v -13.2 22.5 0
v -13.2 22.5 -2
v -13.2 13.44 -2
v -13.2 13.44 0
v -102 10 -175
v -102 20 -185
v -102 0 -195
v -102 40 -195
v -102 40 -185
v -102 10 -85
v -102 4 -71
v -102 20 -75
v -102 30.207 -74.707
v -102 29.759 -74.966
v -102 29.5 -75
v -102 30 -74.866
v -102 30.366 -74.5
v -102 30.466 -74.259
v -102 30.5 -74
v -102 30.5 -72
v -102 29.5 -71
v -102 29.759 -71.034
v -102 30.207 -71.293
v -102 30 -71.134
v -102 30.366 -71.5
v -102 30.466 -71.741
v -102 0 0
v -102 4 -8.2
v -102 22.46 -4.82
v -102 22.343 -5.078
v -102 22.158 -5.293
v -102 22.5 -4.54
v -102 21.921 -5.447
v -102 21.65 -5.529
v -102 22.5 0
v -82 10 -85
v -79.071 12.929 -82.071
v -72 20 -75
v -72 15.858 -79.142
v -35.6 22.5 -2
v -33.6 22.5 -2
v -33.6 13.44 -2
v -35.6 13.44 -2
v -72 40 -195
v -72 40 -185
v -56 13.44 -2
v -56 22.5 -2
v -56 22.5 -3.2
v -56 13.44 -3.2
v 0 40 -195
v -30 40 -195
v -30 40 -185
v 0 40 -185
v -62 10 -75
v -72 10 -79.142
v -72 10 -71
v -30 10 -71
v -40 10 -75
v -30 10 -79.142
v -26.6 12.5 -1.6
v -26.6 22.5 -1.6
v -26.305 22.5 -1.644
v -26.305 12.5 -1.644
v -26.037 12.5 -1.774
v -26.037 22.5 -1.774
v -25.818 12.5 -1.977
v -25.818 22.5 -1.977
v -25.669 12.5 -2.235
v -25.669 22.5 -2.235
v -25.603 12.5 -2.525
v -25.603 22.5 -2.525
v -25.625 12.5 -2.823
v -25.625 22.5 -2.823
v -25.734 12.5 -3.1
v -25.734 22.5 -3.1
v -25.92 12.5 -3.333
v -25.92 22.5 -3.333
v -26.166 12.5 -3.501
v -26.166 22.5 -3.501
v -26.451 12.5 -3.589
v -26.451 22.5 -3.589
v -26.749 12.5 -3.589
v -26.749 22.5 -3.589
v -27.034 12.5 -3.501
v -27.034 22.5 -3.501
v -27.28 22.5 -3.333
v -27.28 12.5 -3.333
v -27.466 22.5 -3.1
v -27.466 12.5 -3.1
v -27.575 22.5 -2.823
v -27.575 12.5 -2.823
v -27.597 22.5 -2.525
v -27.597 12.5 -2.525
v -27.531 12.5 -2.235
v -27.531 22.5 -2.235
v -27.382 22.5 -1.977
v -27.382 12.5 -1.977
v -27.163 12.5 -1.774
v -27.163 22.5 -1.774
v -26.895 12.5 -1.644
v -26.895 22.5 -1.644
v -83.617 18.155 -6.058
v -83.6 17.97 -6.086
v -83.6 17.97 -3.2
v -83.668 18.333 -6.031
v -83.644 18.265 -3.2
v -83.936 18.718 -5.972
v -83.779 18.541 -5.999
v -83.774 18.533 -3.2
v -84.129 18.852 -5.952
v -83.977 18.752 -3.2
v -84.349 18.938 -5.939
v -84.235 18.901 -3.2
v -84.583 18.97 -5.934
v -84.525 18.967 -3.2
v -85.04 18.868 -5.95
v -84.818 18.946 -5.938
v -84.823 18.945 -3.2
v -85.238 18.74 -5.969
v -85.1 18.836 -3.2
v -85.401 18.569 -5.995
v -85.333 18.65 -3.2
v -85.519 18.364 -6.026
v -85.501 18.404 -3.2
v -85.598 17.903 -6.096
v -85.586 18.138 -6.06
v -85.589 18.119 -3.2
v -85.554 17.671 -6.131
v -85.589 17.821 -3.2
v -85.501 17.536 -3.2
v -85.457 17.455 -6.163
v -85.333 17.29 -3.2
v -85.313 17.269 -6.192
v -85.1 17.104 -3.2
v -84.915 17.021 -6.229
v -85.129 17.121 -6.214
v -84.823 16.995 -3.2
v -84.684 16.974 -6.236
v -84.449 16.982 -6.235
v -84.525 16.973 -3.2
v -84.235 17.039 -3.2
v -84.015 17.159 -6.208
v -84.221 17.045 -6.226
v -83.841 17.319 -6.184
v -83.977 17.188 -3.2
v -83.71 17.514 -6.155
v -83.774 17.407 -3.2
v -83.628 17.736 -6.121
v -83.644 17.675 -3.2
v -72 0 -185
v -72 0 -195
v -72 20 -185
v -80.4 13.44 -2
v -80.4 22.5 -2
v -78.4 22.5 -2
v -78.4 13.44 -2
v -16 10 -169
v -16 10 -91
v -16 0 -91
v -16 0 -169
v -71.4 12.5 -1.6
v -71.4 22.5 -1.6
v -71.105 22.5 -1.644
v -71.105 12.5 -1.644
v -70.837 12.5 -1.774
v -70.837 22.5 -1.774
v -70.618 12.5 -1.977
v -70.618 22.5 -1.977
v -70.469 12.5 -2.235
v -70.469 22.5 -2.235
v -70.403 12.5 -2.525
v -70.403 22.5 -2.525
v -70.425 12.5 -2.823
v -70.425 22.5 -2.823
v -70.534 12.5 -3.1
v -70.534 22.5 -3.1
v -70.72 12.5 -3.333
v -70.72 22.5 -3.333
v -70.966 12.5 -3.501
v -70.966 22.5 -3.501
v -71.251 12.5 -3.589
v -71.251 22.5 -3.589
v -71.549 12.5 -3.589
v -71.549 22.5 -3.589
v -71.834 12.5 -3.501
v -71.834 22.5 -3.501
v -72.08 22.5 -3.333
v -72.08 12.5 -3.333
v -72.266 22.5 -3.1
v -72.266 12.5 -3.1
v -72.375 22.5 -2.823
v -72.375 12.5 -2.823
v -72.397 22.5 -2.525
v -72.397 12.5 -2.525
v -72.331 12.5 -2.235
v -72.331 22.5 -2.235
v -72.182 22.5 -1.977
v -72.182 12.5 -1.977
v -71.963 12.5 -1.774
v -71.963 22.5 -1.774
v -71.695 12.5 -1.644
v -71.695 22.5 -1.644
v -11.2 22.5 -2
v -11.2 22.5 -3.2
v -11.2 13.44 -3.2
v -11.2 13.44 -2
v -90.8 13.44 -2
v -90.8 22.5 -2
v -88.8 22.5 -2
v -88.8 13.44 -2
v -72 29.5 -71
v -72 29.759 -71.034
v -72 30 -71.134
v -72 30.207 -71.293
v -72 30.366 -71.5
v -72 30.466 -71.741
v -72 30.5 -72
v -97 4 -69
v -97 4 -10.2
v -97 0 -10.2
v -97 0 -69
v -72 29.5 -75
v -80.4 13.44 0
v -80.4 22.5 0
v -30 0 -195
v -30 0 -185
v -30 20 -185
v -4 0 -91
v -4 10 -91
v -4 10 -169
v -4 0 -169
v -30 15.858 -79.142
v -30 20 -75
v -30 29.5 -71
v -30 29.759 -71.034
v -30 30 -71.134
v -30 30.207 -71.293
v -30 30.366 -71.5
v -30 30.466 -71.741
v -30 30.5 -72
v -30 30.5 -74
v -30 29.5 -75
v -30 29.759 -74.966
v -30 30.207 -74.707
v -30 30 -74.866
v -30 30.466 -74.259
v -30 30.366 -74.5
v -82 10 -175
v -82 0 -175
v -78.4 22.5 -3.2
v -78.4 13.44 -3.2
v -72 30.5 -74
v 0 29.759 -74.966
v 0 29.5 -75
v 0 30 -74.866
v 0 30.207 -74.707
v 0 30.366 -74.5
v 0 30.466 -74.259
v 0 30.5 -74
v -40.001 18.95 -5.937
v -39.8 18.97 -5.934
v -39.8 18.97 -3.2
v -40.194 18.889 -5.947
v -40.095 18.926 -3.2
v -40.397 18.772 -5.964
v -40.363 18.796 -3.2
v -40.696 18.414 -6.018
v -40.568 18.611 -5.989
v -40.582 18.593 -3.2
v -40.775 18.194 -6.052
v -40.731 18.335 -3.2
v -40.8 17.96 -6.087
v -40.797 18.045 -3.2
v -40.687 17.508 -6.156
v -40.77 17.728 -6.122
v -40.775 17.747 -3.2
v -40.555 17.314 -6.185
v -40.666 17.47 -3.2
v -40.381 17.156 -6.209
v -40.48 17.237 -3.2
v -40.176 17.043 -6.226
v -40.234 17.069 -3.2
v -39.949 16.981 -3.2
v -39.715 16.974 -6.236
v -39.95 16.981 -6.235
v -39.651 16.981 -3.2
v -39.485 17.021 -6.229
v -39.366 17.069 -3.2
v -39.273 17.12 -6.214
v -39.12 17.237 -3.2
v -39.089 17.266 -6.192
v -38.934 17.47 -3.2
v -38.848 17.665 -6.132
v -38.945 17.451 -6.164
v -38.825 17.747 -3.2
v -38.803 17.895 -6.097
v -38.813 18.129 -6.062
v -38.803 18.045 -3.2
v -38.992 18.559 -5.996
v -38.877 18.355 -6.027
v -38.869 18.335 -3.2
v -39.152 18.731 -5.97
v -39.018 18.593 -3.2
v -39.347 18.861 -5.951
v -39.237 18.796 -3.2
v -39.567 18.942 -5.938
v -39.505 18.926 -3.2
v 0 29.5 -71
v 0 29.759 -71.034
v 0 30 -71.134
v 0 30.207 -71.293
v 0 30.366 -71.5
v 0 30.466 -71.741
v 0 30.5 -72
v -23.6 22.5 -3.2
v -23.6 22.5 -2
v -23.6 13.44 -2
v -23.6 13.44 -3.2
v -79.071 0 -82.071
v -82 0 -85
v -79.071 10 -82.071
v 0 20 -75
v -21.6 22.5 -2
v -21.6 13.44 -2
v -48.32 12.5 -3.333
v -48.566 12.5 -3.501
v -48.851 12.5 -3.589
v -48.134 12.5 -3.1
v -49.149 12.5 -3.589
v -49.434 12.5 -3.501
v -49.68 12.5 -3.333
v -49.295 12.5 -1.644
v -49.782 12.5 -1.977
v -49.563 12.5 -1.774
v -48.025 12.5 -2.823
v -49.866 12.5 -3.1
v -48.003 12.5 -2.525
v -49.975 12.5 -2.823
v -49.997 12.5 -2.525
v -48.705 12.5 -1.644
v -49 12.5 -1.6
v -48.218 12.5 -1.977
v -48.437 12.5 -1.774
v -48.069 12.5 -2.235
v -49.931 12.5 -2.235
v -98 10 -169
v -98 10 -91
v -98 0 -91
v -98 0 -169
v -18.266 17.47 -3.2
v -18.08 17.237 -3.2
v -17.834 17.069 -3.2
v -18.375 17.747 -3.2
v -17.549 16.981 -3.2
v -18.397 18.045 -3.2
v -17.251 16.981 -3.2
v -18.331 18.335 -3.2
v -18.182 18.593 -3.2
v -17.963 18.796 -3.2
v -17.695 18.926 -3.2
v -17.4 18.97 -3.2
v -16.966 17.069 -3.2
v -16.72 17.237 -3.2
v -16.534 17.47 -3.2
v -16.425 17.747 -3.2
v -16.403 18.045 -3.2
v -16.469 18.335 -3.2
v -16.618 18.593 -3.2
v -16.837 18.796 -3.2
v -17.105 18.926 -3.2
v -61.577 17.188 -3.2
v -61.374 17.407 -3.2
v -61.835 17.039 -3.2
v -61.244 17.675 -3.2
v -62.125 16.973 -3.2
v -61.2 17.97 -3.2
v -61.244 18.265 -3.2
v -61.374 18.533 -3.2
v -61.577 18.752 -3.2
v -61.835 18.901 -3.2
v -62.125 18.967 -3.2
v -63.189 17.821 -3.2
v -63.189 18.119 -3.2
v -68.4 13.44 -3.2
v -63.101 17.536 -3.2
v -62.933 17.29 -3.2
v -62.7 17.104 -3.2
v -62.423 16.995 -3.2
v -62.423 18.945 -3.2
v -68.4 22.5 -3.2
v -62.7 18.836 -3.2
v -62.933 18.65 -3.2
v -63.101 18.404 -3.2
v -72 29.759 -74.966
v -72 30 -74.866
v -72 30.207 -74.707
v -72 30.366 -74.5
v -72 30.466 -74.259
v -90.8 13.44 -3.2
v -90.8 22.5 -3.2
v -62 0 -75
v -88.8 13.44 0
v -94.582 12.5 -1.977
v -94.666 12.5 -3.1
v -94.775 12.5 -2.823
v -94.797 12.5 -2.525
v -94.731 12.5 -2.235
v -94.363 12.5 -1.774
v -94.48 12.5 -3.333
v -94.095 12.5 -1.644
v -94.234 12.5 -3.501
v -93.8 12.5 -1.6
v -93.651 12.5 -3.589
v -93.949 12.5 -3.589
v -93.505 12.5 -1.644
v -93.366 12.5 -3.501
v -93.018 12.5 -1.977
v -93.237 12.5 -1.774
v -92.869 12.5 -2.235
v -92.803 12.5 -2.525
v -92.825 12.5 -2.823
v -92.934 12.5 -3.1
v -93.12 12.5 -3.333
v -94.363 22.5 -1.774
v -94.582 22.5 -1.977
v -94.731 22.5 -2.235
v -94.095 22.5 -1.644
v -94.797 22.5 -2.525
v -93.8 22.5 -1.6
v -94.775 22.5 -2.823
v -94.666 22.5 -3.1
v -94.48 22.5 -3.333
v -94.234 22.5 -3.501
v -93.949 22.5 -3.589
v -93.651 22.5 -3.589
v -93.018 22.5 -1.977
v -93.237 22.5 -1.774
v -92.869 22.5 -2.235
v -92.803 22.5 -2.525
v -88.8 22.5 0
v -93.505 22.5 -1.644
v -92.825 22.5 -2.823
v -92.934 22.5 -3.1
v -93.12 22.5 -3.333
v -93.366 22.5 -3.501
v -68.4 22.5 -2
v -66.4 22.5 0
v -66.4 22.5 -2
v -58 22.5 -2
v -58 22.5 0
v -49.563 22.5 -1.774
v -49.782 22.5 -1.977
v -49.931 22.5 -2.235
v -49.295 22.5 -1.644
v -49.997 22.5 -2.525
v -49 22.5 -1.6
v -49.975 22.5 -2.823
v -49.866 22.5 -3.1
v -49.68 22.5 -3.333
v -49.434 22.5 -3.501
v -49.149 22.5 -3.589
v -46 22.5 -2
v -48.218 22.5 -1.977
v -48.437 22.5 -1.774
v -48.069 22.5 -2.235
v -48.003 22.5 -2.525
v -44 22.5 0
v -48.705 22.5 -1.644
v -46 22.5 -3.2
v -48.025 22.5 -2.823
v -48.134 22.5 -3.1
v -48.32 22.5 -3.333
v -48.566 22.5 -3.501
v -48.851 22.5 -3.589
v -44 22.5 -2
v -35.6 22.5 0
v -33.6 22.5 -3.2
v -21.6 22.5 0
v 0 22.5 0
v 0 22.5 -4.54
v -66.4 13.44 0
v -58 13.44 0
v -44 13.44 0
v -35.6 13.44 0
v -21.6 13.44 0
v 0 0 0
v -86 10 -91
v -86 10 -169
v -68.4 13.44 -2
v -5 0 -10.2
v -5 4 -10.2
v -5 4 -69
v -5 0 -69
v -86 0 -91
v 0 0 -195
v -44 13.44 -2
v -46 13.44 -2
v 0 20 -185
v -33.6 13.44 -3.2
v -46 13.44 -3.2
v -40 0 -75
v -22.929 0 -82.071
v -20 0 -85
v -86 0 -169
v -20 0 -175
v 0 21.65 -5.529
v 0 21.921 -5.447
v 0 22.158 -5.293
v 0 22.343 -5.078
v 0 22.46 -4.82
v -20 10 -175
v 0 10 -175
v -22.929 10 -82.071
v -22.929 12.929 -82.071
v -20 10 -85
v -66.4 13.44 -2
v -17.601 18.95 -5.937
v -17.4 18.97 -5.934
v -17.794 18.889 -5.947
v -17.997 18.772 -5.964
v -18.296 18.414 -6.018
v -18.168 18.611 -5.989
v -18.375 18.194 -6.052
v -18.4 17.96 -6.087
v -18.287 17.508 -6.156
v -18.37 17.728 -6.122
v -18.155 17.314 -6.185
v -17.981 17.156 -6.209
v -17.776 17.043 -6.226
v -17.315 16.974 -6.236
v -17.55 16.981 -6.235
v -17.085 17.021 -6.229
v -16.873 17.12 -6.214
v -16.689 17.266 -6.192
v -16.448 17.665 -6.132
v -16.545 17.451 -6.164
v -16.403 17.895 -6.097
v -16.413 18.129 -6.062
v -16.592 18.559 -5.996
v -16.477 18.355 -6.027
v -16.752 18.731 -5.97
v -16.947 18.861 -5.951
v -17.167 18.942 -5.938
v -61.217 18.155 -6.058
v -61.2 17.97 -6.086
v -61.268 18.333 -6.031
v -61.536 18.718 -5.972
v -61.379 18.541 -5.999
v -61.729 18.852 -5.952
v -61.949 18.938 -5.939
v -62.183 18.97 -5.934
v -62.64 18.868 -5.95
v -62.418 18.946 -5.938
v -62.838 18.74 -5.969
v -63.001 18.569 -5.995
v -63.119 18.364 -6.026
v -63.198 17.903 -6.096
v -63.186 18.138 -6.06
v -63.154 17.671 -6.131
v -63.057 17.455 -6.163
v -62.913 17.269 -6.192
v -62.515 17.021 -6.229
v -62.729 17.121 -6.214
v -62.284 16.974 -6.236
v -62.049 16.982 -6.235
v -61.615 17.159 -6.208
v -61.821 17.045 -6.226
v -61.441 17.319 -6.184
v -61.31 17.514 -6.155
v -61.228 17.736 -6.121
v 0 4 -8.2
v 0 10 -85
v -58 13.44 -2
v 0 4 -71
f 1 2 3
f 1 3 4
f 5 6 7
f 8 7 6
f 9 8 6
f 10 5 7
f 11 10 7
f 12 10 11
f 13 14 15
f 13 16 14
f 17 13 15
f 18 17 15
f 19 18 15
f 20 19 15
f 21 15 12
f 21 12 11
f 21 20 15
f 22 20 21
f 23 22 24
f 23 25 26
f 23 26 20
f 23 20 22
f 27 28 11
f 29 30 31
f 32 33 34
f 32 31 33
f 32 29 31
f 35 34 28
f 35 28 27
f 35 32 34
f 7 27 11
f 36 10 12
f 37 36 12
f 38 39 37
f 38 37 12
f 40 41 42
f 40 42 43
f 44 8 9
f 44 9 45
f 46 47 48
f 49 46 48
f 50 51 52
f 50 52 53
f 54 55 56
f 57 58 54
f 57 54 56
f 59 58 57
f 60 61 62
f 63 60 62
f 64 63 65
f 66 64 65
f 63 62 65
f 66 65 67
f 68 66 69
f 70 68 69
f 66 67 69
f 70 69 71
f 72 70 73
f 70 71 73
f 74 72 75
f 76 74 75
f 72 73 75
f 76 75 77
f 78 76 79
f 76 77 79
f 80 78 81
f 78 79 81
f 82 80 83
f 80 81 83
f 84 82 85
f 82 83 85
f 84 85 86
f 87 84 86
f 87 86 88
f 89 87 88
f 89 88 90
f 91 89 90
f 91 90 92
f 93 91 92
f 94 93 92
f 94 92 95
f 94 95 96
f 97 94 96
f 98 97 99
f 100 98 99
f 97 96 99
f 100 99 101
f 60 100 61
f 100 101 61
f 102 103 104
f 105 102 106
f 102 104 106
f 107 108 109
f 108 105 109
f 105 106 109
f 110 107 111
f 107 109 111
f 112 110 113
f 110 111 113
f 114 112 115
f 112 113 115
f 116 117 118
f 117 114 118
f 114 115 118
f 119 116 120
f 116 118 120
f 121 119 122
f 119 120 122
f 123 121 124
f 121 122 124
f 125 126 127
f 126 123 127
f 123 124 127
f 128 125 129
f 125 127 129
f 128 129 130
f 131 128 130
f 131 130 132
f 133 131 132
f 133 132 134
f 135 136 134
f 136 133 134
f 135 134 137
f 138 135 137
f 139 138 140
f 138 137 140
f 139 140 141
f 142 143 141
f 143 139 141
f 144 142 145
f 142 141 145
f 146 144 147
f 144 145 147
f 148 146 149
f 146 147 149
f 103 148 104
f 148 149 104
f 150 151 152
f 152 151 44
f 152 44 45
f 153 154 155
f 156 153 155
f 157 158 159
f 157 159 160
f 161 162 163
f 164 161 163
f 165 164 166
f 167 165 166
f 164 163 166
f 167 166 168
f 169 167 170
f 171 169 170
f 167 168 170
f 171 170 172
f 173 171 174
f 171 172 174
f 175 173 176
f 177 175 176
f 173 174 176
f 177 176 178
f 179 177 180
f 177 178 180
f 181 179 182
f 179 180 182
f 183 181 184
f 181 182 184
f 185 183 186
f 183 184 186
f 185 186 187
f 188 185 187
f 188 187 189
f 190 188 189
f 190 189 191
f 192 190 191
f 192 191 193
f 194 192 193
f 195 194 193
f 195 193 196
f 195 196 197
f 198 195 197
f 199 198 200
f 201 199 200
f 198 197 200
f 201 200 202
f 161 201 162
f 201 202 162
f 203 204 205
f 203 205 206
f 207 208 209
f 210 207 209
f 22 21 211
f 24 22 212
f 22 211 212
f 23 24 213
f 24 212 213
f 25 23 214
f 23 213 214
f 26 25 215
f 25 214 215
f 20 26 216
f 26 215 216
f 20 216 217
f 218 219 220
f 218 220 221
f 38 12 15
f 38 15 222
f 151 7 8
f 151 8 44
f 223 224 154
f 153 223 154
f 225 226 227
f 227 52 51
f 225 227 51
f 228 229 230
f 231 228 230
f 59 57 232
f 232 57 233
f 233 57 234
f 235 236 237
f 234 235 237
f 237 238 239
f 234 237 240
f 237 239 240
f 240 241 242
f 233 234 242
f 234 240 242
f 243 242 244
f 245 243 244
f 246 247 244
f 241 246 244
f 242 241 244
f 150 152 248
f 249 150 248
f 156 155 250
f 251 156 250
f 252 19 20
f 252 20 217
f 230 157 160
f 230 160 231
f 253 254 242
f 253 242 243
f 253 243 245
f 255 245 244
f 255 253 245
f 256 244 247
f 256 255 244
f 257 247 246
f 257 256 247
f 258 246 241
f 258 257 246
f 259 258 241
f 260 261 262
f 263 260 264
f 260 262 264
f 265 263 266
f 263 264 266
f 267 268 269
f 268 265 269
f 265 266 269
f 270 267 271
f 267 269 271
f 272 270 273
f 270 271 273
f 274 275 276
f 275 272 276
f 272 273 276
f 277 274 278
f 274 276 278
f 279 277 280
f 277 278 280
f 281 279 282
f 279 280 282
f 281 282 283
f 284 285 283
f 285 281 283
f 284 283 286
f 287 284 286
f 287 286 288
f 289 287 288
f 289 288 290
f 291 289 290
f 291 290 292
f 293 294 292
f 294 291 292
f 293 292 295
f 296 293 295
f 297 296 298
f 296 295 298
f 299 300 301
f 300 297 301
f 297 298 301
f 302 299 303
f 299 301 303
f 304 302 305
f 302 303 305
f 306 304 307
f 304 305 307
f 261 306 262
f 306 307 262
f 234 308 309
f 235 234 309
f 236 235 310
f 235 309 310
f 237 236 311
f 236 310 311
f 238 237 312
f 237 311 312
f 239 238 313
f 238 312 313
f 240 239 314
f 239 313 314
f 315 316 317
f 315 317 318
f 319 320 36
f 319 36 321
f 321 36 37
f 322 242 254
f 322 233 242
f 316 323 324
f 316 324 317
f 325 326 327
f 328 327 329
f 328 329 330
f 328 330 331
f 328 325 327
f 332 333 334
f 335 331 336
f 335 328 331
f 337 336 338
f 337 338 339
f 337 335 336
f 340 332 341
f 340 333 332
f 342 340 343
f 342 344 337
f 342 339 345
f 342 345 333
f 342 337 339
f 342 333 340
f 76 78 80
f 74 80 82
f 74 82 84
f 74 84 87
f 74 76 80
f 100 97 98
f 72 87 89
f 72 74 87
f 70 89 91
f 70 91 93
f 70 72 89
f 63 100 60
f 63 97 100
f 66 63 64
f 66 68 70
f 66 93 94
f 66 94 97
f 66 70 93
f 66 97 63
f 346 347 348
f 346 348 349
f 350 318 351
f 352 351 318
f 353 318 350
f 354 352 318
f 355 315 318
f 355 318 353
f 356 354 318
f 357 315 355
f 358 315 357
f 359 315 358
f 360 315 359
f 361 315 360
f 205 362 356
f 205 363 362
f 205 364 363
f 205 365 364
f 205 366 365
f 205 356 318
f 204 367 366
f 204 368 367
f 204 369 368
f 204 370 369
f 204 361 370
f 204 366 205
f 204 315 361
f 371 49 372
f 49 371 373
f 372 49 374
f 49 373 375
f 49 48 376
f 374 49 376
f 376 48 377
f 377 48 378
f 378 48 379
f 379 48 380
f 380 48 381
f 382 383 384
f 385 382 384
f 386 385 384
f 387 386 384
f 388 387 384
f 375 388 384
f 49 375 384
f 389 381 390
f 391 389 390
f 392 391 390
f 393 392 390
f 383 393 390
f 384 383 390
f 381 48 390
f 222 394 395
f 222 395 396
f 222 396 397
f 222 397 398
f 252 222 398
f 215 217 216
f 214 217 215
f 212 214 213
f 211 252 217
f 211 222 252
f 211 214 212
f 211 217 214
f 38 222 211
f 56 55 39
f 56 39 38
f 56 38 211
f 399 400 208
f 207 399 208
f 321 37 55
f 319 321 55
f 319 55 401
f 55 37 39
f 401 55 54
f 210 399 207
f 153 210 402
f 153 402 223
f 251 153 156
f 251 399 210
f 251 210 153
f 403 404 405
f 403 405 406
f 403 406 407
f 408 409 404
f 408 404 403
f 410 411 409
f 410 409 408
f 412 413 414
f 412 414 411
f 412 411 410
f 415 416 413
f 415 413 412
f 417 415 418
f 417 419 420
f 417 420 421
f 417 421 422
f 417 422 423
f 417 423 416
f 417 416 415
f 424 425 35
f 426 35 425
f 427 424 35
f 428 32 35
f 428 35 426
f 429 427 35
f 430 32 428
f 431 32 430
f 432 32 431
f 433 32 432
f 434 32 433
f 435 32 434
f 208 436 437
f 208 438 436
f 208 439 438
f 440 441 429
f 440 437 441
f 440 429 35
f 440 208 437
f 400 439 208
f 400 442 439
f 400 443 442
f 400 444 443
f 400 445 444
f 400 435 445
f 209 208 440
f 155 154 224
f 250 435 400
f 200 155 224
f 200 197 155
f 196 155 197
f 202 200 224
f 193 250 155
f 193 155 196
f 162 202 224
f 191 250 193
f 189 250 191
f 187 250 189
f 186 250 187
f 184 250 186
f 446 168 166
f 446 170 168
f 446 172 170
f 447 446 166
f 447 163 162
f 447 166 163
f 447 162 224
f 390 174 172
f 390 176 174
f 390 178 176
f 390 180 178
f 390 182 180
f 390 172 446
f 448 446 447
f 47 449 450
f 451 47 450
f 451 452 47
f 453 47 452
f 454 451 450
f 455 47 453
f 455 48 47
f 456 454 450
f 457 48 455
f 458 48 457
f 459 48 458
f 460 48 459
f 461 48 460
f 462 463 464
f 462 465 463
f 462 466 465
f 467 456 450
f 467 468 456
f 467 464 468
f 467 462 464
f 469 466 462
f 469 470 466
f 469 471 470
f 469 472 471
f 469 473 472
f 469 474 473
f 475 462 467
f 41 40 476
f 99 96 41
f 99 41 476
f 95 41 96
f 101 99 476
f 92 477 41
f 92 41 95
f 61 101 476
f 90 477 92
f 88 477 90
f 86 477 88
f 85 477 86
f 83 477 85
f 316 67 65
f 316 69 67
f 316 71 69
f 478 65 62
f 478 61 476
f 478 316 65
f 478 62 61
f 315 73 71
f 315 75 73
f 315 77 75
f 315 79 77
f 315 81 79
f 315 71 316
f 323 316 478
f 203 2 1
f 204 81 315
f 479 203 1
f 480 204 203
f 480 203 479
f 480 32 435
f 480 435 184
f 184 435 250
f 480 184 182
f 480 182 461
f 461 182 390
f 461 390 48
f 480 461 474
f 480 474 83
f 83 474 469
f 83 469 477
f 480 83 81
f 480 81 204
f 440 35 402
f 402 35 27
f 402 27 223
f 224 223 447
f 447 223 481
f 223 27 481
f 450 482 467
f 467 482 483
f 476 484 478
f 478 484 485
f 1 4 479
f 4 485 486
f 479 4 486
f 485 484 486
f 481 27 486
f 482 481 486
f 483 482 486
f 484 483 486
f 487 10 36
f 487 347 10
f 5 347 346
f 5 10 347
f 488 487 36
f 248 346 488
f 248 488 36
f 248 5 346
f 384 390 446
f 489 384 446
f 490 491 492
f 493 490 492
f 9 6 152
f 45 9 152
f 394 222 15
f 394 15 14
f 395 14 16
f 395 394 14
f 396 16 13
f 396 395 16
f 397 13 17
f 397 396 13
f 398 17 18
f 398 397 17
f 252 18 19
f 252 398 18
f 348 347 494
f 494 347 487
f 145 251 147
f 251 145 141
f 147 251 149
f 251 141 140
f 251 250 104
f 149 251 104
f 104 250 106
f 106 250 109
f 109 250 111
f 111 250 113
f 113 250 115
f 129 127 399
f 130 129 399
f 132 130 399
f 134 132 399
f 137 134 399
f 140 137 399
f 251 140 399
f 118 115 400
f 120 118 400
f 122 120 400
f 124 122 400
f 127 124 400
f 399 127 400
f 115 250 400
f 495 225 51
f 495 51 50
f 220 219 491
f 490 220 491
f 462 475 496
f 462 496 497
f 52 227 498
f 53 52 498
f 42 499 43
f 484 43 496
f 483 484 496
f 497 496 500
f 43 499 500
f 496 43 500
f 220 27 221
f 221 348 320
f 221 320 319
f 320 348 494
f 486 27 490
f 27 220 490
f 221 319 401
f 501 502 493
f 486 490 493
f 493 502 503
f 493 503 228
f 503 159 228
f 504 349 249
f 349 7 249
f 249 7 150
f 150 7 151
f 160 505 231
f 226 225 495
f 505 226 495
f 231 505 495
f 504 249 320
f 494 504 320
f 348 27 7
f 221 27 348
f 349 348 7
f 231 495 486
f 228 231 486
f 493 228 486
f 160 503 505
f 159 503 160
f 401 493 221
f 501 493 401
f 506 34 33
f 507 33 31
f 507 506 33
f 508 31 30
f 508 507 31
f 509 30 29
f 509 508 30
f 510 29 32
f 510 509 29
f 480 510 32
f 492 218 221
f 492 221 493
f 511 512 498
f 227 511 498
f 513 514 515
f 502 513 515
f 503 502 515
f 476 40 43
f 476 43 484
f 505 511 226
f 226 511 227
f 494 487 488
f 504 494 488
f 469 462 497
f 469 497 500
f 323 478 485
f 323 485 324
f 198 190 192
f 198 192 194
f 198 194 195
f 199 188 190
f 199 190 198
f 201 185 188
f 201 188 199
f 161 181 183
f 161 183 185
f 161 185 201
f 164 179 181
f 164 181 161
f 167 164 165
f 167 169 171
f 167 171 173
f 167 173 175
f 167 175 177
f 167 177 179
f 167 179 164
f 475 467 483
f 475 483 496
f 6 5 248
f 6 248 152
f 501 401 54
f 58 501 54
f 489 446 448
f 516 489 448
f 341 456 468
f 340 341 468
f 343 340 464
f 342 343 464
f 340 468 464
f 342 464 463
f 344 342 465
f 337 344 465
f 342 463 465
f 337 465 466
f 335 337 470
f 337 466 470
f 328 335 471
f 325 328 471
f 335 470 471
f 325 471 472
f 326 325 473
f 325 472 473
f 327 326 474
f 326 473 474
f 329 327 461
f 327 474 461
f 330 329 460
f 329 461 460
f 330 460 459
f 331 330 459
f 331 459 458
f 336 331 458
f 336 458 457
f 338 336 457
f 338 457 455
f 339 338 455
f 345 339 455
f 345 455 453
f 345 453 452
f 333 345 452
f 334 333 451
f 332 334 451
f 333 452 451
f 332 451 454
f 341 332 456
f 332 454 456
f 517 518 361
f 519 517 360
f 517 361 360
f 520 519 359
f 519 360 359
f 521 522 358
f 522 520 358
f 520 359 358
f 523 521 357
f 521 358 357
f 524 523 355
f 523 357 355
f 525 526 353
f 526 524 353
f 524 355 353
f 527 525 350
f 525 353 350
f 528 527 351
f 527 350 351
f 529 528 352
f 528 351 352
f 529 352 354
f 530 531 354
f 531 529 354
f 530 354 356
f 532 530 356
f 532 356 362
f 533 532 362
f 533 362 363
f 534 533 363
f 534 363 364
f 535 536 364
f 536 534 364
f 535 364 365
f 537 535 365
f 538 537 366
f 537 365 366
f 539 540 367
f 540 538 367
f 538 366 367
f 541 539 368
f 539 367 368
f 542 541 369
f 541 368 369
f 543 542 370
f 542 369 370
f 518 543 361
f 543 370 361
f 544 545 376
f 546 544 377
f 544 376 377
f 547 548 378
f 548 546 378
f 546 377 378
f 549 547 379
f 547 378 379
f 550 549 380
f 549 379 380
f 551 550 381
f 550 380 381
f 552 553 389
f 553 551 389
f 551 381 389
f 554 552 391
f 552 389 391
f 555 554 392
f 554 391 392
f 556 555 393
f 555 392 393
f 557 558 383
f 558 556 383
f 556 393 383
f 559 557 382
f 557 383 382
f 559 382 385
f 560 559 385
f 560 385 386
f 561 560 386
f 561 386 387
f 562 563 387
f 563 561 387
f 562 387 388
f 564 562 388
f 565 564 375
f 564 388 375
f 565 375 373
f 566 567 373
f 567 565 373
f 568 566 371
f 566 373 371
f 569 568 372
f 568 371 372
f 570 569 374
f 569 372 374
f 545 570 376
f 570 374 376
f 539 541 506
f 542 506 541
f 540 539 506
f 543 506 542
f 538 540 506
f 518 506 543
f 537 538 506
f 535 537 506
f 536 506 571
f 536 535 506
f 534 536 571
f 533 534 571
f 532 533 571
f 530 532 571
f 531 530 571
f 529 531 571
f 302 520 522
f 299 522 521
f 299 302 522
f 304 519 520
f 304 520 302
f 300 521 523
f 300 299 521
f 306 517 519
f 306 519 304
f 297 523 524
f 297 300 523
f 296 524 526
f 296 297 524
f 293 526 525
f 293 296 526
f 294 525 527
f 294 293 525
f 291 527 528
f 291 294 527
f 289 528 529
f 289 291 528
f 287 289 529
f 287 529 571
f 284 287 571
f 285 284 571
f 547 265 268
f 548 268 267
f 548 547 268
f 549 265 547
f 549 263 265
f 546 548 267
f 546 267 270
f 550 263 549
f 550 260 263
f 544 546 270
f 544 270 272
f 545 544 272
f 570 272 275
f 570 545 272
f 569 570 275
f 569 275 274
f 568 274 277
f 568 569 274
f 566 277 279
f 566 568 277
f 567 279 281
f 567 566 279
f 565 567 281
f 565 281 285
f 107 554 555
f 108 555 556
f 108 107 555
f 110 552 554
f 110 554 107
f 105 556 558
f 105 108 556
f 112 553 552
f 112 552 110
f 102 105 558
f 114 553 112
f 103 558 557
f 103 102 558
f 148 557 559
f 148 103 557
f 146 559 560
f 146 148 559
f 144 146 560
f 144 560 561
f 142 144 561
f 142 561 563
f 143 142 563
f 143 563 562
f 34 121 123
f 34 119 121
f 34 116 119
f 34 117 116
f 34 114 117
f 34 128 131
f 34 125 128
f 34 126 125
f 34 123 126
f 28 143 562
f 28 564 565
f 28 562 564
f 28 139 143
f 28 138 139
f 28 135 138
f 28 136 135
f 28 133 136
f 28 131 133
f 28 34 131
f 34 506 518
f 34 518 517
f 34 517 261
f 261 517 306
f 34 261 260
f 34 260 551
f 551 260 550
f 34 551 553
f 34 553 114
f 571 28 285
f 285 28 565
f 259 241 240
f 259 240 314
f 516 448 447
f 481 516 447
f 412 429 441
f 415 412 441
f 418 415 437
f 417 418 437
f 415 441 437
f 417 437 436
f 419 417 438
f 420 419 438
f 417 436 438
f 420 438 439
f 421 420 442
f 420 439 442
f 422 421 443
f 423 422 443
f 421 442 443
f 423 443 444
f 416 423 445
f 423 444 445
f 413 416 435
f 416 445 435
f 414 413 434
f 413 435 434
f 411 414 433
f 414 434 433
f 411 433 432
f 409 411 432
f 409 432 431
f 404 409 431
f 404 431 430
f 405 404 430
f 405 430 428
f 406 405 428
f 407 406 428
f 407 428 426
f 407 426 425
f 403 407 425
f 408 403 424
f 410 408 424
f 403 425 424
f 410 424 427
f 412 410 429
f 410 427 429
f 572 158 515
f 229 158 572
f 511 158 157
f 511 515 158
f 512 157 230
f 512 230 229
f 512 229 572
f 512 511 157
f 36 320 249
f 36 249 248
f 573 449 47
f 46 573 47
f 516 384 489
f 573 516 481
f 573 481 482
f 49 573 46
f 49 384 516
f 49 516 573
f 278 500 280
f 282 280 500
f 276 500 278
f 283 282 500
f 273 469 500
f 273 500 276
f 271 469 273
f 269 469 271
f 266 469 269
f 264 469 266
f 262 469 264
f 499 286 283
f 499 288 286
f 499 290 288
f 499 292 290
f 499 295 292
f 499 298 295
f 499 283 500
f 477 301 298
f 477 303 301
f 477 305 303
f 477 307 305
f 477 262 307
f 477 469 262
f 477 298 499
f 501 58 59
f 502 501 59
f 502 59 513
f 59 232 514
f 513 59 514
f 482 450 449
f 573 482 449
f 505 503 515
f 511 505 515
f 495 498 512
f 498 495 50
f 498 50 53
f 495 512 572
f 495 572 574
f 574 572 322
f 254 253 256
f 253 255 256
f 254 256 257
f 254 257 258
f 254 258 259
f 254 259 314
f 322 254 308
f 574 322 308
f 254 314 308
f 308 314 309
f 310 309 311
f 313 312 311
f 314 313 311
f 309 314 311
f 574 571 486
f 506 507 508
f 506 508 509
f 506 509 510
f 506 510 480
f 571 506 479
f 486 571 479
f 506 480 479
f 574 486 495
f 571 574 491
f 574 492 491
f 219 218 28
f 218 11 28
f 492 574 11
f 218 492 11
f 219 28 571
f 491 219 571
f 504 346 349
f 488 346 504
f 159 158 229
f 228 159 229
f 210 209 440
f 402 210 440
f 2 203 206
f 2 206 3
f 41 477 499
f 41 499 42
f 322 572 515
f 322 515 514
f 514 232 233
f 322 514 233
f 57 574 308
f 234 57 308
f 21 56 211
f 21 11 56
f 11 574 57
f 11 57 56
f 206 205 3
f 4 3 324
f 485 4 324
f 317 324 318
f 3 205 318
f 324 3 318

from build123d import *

# Parameters (mm, degrees)
SKETCH_1_W           = 102
SKETCH_1_H           = 75
EXTRUDE_1_DEPTH      = 22.5
CUT_EXTRUDE_1_DEPTH  = 9.06
SKETCH_3_W           = 102
SKETCH_3_H           = 66.8
CUT_EXTRUDE_2_DEPTH  = 12
SKETCH_4_W           = 62.8
SKETCH_4_H           = 6.5
CUT_EXTRUDE_3_DEPTH  = 129.589463021
SKETCH_6_W           = 102
SKETCH_6_H           = 4
EXTRUDE_2_DEPTH      = 20
SKETCH_7_W           = 92
SKETCH_7_H           = 58.8
CUT_EXTRUDE_5_DEPTH  = 8
CUT_EXTRUDE_6_DEPTH  = 108
FILLET_2_R           = 1
SKETCH_10_R          = 1
CUT_EXTRUDE_7_DEPTH  = 10
SKETCH_14_R          = 1
CUT_EXTRUDE_8_DEPTH  = 10
SKETCH_15_W          = 20
SKETCH_15_H          = 10
EXTRUDE_3_DEPTH      = 120
SKETCH_16_W          = 10
SKETCH_16_H          = 10
EXTRUDE_4_DEPTH      = 80
CHAMFER_1_SIZE       = 10
SKETCH_17_W          = 102
SKETCH_17_H          = 10
EXTRUDE_5_DEPTH      = 30
CUT_EXTRUDE_9_DEPTH  = 50
SKETCH_20_W          = 12
SKETCH_20_H          = 78
CUT_EXTRUDE_10_DEPTH = 50
SKETCH_21_W          = 4
SKETCH_21_H          = 10
EXTRUDE_6_DEPTH      = 50
CHAMFER_2_SIZE       = 10
CHAMFER_3_SIZE       = 10


with BuildPart() as part:
    # 草图1 → 凸台-拉伸1 (new body)
    with BuildSketch(Plane(origin=(0, 0, 0), x_dir=(1, 0, 0), z_dir=(0, 1, 0))):
        with Locations((-51, 37.5)):
            Rectangle(SKETCH_1_W, SKETCH_1_H)
    extrude(amount=EXTRUDE_1_DEPTH)

    # 草图2 → 切除-拉伸1 (cut)
    with BuildSketch(Plane(origin=(0, 22.5, 0), x_dir=(1, 0, 0), z_dir=(0, 1, 0))):
        Polygon((-90.8, 2), (-88.8, 2), (-88.8, 0), (-80.4, 0), (-80.4, 2), (-78.4, 2), (-78.4, 3.2), (-90.8, 3.2), align=None)
        Polygon((-68.4, 2), (-66.4, 2), (-66.4, 0), (-58, 0), (-58, 2), (-56, 2), (-56, 3.2), (-68.4, 3.2), align=None)
        Polygon((-46, 3.2), (-33.6, 3.2), (-33.6, 2), (-35.6, 2), (-35.6, 0), (-44, 0), (-44, 2), (-46, 2), align=None)
        Polygon((-23.6, 3.2), (-11.2, 3.2), (-11.2, 2), (-13.2, 2), (-13.2, 0), (-21.6, 0), (-21.6, 2), (-23.6, 2), align=None)
    extrude(amount=-CUT_EXTRUDE_1_DEPTH, mode=Mode.SUBTRACT)

    # 草图3 → 切除-拉伸2 (cut)
    with BuildSketch(Plane(origin=(0, 22.5, 0), x_dir=(1, 0, 0), z_dir=(0, 1, 0))):
        with Locations((-51, 41.6)):
            Rectangle(SKETCH_3_W, SKETCH_3_H)
    extrude(amount=-CUT_EXTRUDE_2_DEPTH, mode=Mode.SUBTRACT)

    # 草图4 → 切除-拉伸3 (cut, through all)
    with BuildSketch(Plane.ZY.offset(102)):
        with Locations((-39.6, 7.25)):
            Rectangle(SKETCH_4_W, SKETCH_4_H)
    extrude(amount=-CUT_EXTRUDE_3_DEPTH, mode=Mode.SUBTRACT)

    # 草图6 → 凸台-拉伸2 (add)
    with BuildSketch(Plane(origin=(0, 10.5, 0), x_dir=(1, 0, 0), z_dir=(0, 1, 0))):
        with Locations((-51, 73)):
            Rectangle(SKETCH_6_W, SKETCH_6_H)
    extrude(amount=EXTRUDE_2_DEPTH)

    # 草图7 → 切除-拉伸5 (cut)
    with BuildSketch(Plane(origin=(0, 4, 0), x_dir=(1, 0, 0), z_dir=(0, 1, 0))):
        with Locations((-51, 39.6)):
            Rectangle(SKETCH_7_W, SKETCH_7_H)
    extrude(amount=-CUT_EXTRUDE_5_DEPTH, mode=Mode.SUBTRACT)

    # 草图9 → 切除-拉伸6 (cut)
    with BuildSketch(Plane.ZY.offset(102)):
        Polygon((-8.2, 22.5), (-5.4, 22.5), (-8.2, 4), align=None)
    extrude(amount=-CUT_EXTRUDE_6_DEPTH, mode=Mode.SUBTRACT)

    # 圆角2
    fillet_2_edges = [part.edges().sort_by_distance(p)[0] for p in [
        (-51, 30.5, -71),
        (-51, 30.5, -75),
        (-51, 22.5, -5.4),
    ]]
    fillet(fillet_2_edges, radius=FILLET_2_R)

    # 草图10 → 切除-拉伸7 (cut)
    with BuildSketch(Plane.XY.offset(-3.2)):
        with Locations((-84.6, 17.97)):
            Circle(SKETCH_10_R)
        with Locations((-62.2, 17.97)):
            Circle(SKETCH_10_R)
        with Locations(Location((-39.8, 17.97, 0), (0, 0, 90))):
            Circle(SKETCH_10_R)
        with Locations(Location((-17.4, 17.97, 0), (0, 0, 90))):
            Circle(SKETCH_10_R)
    extrude(amount=-CUT_EXTRUDE_7_DEPTH, mode=Mode.SUBTRACT)

    # 草图14 → 切除-拉伸8 (cut)
    with BuildSketch(Plane(origin=(0, 22.5, 0), x_dir=(1, 0, 0), z_dir=(0, 1, 0))):
        with Locations(Location((-93.8, 2.6, 0), (0, 0, 270))):
            Circle(SKETCH_14_R)
        with Locations(Location((-71.4, 2.6, 0), (0, 0, 270))):
            Circle(SKETCH_14_R)
        with Locations(Location((-49, 2.6, 0), (0, 0, 270))):
            Circle(SKETCH_14_R)
        with Locations(Location((-26.6, 2.6, 0), (0, 0, 270))):
            Circle(SKETCH_14_R)
    extrude(amount=-CUT_EXTRUDE_8_DEPTH, mode=Mode.SUBTRACT)

    # 草图15 → 凸台-拉伸3 (add)
    with BuildSketch(Plane(origin=(0, 0, -75), x_dir=(-1, 0, 0), z_dir=(0, 0, -1))):
        with Locations((10, 5)):
            Rectangle(SKETCH_15_W, SKETCH_15_H)
        with Locations((92, 5)):
            Rectangle(SKETCH_15_W, SKETCH_15_H)
    extrude(amount=EXTRUDE_3_DEPTH)

    # 草图16 → 凸台-拉伸4 (add)
    with BuildSketch(Plane(origin=(-82, 0, 0), x_dir=(0, 0, -1), z_dir=(1, 0, 0))):
        with Locations((190, 5)):
            Rectangle(SKETCH_16_W, SKETCH_16_H)
    extrude(amount=EXTRUDE_4_DEPTH)

    # 倒角1
    chamfer_1_edges = [part.edges().sort_by_distance(p)[0] for p in [
        (-20, 5, -75),
        (-82, 5, -75),
        (-20, 5, -185),
        (-82, 5, -185),
    ]]
    chamfer(chamfer_1_edges, length=CHAMFER_1_SIZE)

    # 草图17 → 凸台-拉伸5 (add)
    with BuildSketch(Plane(origin=(0, 10, 0), x_dir=(1, 0, 0), z_dir=(0, 1, 0))):
        with Locations((-51, 190)):
            Rectangle(SKETCH_17_W, SKETCH_17_H)
    extrude(amount=EXTRUDE_5_DEPTH)

    # 草图19 → 切除-拉伸9 (cut)
    with BuildSketch(Plane(origin=(0, 40, 0), x_dir=(1, 0, 0), z_dir=(0, 1, 0))):
        Polygon((-72, 185), (-72, 75), (-72, 71), (-30, 71), (-30, 75), (-30, 185), (-30, 195), (-72, 195), align=None)
    extrude(amount=-CUT_EXTRUDE_9_DEPTH, mode=Mode.SUBTRACT)

    # 草图20 → 切除-拉伸10 (cut)
    with BuildSketch(Plane(origin=(0, 10, 0), x_dir=(1, 0, 0), z_dir=(0, 1, 0))):
        with Locations((-92, 130)):
            Rectangle(SKETCH_20_W, SKETCH_20_H)
        with Locations((-10, 130)):
            Rectangle(SKETCH_20_W, SKETCH_20_H)
    extrude(amount=-CUT_EXTRUDE_10_DEPTH, mode=Mode.SUBTRACT)

    # 草图21 → 凸台-拉伸6 (add)
    with BuildSketch(Plane(origin=(-72, 0, 0), x_dir=(0, 0, -1), z_dir=(1, 0, 0))):
        with Locations((73, 5)):
            Rectangle(SKETCH_21_W, SKETCH_21_H)
    extrude(amount=EXTRUDE_6_DEPTH)

    # 倒角2
    # the kernel refuses this chamfer: 10 mm, written as the material it adds along each edge
    with BuildSketch(Plane(origin=(-30, 0, -75), x_dir=(-0.9998910622590237, 0, 0.01476020374253316), z_dir=(0, 1, 0))) as chamfer_2_piece_1:
        Polygon((CHAMFER_2_SIZE * 0.999891062259, -CHAMFER_2_SIZE * 0.0147602037425), (-CHAMFER_2_SIZE * 0.717466790729, -CHAMFER_2_SIZE * 0.696592710413), (0, 0), align=None)
    extrude(amount=10)
    with BuildSketch(Plane(origin=(-72, 0, -75), x_dir=(0.9998910622590237, 0, 0.01476020374253316), z_dir=(0, 1, 0))) as chamfer_2_piece_2:
        Polygon((CHAMFER_2_SIZE * 0.999891062259, CHAMFER_2_SIZE * 0.0147602037425), (-CHAMFER_2_SIZE * 0.717466790729, CHAMFER_2_SIZE * 0.696592710413), (0, 0), align=None)
    extrude(amount=10)

    # 倒角3
    # the kernel refuses this chamfer: 10 mm, written as the material it adds along each edge
    with BuildSketch(Plane(origin=(-30, 10, -75), x_dir=(0, -0.027495876610585588, -0.9996219169112968), z_dir=(1, 0, 0))) as chamfer_3_piece_1_section:
        Polygon((CHAMFER_3_SIZE * 0.999621916911, CHAMFER_3_SIZE * 0.0274958766106), (-CHAMFER_3_SIZE * 0.0274958766106, CHAMFER_3_SIZE * 0.999621916911), (0, 0), align=None)
    chamfer_3_piece_1 = extrude(amount=30, mode=Mode.PRIVATE)
    chamfer_3_piece_1 = split(chamfer_3_piece_1, bisect_by=Plane(origin=(-27.264199431, 13.202688984, -77.735800569), z_dir=(-0.7071067811865476, 0, -0.7071067811865476)), keep=Keep.TOP, mode=Mode.PRIVATE)
    chamfer_3_piece_1 = split(chamfer_3_piece_1, bisect_by=Plane(origin=(-28.501657804, 13.202688984, -79.762769282), z_dir=(0.382683432365518, 0, 0.9238795325111094)), keep=Keep.TOP, mode=Mode.PRIVATE)
    add(chamfer_3_piece_1)
    with BuildSketch(Plane(origin=(-30, 10, -75), x_dir=(0, -0.027495876610585588, -0.9996219169112968), z_dir=(1, 0, 0))) as chamfer_3_piece_2_section:
        Polygon((CHAMFER_3_SIZE * 0.999621916911, CHAMFER_3_SIZE * 0.0274958766106), (-CHAMFER_3_SIZE * 0.0274958766106, CHAMFER_3_SIZE * 0.999621916911), (0, 0), align=None)
    chamfer_3_piece_2 = extrude(amount=30, mode=Mode.PRIVATE)
    chamfer_3_piece_2 = split(chamfer_3_piece_2, bisect_by=Plane(origin=(-20, 10.692968827, -83.273838091), z_dir=(-1, 0, 0)), keep=Keep.TOP, mode=Mode.PRIVATE)
    chamfer_3_piece_2 = split(chamfer_3_piece_2, bisect_by=Plane(origin=(-21.434414815, 10.692968827, -83.565585185), z_dir=(0.7071067811865476, 0, 0.7071067811865476)), keep=Keep.TOP, mode=Mode.PRIVATE)
    chamfer_3_piece_2 = split(chamfer_3_piece_2, bisect_by=Plane(origin=(-20.979016586, 10.692968827, -82.8787493), z_dir=(-0.382683432365518, 0, -0.9238795325111094)), keep=Keep.TOP, mode=Mode.PRIVATE)
    add(chamfer_3_piece_2)
    with BuildSketch(Plane(origin=(-30, 10, -75), x_dir=(0, -0.027495876610585588, -0.9996219169112968), z_dir=(1, 0, 0))) as chamfer_3_piece_3_section:
        Polygon((CHAMFER_3_SIZE * 0.999621916911, CHAMFER_3_SIZE * 0.0274958766106), (-CHAMFER_3_SIZE * 0.0274958766106, CHAMFER_3_SIZE * 0.999621916911), (0, 0), align=None)
    chamfer_3_piece_3 = extrude(amount=30, mode=Mode.PRIVATE)
    chamfer_3_piece_3 = split(chamfer_3_piece_3, bisect_by=Plane(origin=(-20, 13.842005871, -77.275424956), z_dir=(-1, 0, 0)), keep=Keep.TOP, mode=Mode.PRIVATE)
    chamfer_3_piece_3 = split(chamfer_3_piece_3, bisect_by=Plane(origin=(-25.789156248, 13.842005871, -79.210843752), z_dir=(0.7071067811865476, 0, 0.7071067811865476)), keep=Keep.TOP, mode=Mode.PRIVATE)
    chamfer_3_piece_3 = split(chamfer_3_piece_3, bisect_by=Plane(origin=(-25.413818648, 13.842005871, -81.041794139), z_dir=(0.382683432365518, 0, 0.9238795325111094)), keep=Keep.TOP, mode=Mode.PRIVATE)
    add(chamfer_3_piece_3)
    with BuildSketch(Plane(origin=(-30, 10, -75), x_dir=(0, -0.027495876610585588, -0.9996219169112968), z_dir=(1, 0, 0))) as chamfer_3_piece_4_section:
        Polygon((CHAMFER_3_SIZE * 0.999621916911, CHAMFER_3_SIZE * 0.0274958766106), (-CHAMFER_3_SIZE * 0.0274958766106, CHAMFER_3_SIZE * 0.999621916911), (0, 0), align=None)
    chamfer_3_piece_4 = extrude(amount=30, mode=Mode.PRIVATE)
    chamfer_3_piece_4 = split(chamfer_3_piece_4, bisect_by=Plane(origin=(-20, 10.112698884, -84.362076481), z_dir=(1, 0, 0)), keep=Keep.TOP, mode=Mode.PRIVATE)
    chamfer_3_piece_4 = split(chamfer_3_piece_4, bisect_by=Plane(origin=(-19.665237882, 10.112698884, -85.334762118), z_dir=(0.7071067811865476, 0, 0.7071067811865476)), keep=Keep.TOP, mode=Mode.PRIVATE)
    chamfer_3_piece_4 = split(chamfer_3_piece_4, bisect_by=Plane(origin=(-18.50296184, 10.112698884, -83.904364757), z_dir=(-0.382683432365518, 0, -0.9238795325111094)), keep=Keep.TOP, mode=Mode.PRIVATE)
    add(chamfer_3_piece_4)
    with BuildSketch(Plane(origin=(-30, 10, -75), x_dir=(0, -0.027495876610585588, -0.9996219169112968), z_dir=(1, 0, 0))) as chamfer_3_piece_5_section:
        Polygon((CHAMFER_3_SIZE * 0.999621916911, CHAMFER_3_SIZE * 0.0274958766106), (-CHAMFER_3_SIZE * 0.0274958766106, CHAMFER_3_SIZE * 0.999621916911), (0, 0), align=None)
    chamfer_3_piece_5 = extrude(amount=30, mode=Mode.PRIVATE)
    chamfer_3_piece_5 = split(chamfer_3_piece_5, bisect_by=Plane(origin=(-20, 13.309351743, -78.276203383), z_dir=(1, 0, 0)), keep=Keep.TOP, mode=Mode.PRIVATE)
    chamfer_3_piece_5 = split(chamfer_3_piece_5, bisect_by=Plane(origin=(-13.20849449, 13.309351743, -86.097404939), z_dir=(0.382683432365518, 0, 0.9238795325111094)), keep=Keep.TOP, mode=Mode.PRIVATE)
    add(chamfer_3_piece_5)
    with BuildSketch(Plane(origin=(-72, 10, -75), x_dir=(0, -0.027495876610586147, -0.9996219169112968), z_dir=(-1, 0, 0))) as chamfer_3_piece_6_section:
        Polygon((CHAMFER_3_SIZE * 0.999621916911, -CHAMFER_3_SIZE * 0.0274958766106), (-CHAMFER_3_SIZE * 0.0274958766106, -CHAMFER_3_SIZE * 0.999621916911), (0, 0), align=None)
    chamfer_3_piece_6 = extrude(amount=30, mode=Mode.PRIVATE)
    chamfer_3_piece_6 = split(chamfer_3_piece_6, bisect_by=Plane(origin=(-73.498342196, 13.202688984, -79.762769282), z_dir=(-0.382683432365518, 0, 0.9238795325111094)), keep=Keep.TOP, mode=Mode.PRIVATE)
    chamfer_3_piece_6 = split(chamfer_3_piece_6, bisect_by=Plane(origin=(-74.735800569, 13.202688984, -77.735800569), z_dir=(0.7071067811865476, 0, -0.7071067811865476)), keep=Keep.TOP, mode=Mode.PRIVATE)
    add(chamfer_3_piece_6)
    with BuildSketch(Plane(origin=(-72, 10, -75), x_dir=(0, -0.027495876610586147, -0.9996219169112968), z_dir=(-1, 0, 0))) as chamfer_3_piece_7_section:
        Polygon((CHAMFER_3_SIZE * 0.999621916911, -CHAMFER_3_SIZE * 0.0274958766106), (-CHAMFER_3_SIZE * 0.0274958766106, -CHAMFER_3_SIZE * 0.999621916911), (0, 0), align=None)
    chamfer_3_piece_7 = extrude(amount=30, mode=Mode.PRIVATE)
    chamfer_3_piece_7 = split(chamfer_3_piece_7, bisect_by=Plane(origin=(-81.020983414, 10.692968827, -82.8787493), z_dir=(0.382683432365518, 0, -0.9238795325111094)), keep=Keep.TOP, mode=Mode.PRIVATE)
    chamfer_3_piece_7 = split(chamfer_3_piece_7, bisect_by=Plane(origin=(-80.565585185, 10.692968827, -83.565585185), z_dir=(-0.7071067811865476, 0, 0.7071067811865476)), keep=Keep.TOP, mode=Mode.PRIVATE)
    chamfer_3_piece_7 = split(chamfer_3_piece_7, bisect_by=Plane(origin=(-82, 10.692968827, -83.273838091), z_dir=(1, 0, 0)), keep=Keep.TOP, mode=Mode.PRIVATE)
    add(chamfer_3_piece_7)
    with BuildSketch(Plane(origin=(-72, 10, -75), x_dir=(0, -0.027495876610586147, -0.9996219169112968), z_dir=(-1, 0, 0))) as chamfer_3_piece_8_section:
        Polygon((CHAMFER_3_SIZE * 0.999621916911, -CHAMFER_3_SIZE * 0.0274958766106), (-CHAMFER_3_SIZE * 0.0274958766106, -CHAMFER_3_SIZE * 0.999621916911), (0, 0), align=None)
    chamfer_3_piece_8 = extrude(amount=30, mode=Mode.PRIVATE)
    chamfer_3_piece_8 = split(chamfer_3_piece_8, bisect_by=Plane(origin=(-76.586181352, 13.842005871, -81.041794139), z_dir=(-0.382683432365518, 0, 0.9238795325111094)), keep=Keep.TOP, mode=Mode.PRIVATE)
    chamfer_3_piece_8 = split(chamfer_3_piece_8, bisect_by=Plane(origin=(-76.210843752, 13.842005871, -79.210843752), z_dir=(-0.7071067811865476, 0, 0.7071067811865476)), keep=Keep.TOP, mode=Mode.PRIVATE)
    chamfer_3_piece_8 = split(chamfer_3_piece_8, bisect_by=Plane(origin=(-82, 13.842005871, -77.275424956), z_dir=(1, 0, 0)), keep=Keep.TOP, mode=Mode.PRIVATE)
    add(chamfer_3_piece_8)
    with BuildSketch(Plane(origin=(-72, 10, -75), x_dir=(0, -0.027495876610586147, -0.9996219169112968), z_dir=(-1, 0, 0))) as chamfer_3_piece_9_section:
        Polygon((CHAMFER_3_SIZE * 0.999621916911, -CHAMFER_3_SIZE * 0.0274958766106), (-CHAMFER_3_SIZE * 0.0274958766106, -CHAMFER_3_SIZE * 0.999621916911), (0, 0), align=None)
    chamfer_3_piece_9 = extrude(amount=30, mode=Mode.PRIVATE)
    chamfer_3_piece_9 = split(chamfer_3_piece_9, bisect_by=Plane(origin=(-83.49703816, 10.112698884, -83.904364757), z_dir=(0.382683432365518, 0, -0.9238795325111094)), keep=Keep.TOP, mode=Mode.PRIVATE)
    chamfer_3_piece_9 = split(chamfer_3_piece_9, bisect_by=Plane(origin=(-82.334762118, 10.112698884, -85.334762118), z_dir=(-0.7071067811865476, 0, 0.7071067811865476)), keep=Keep.TOP, mode=Mode.PRIVATE)
    chamfer_3_piece_9 = split(chamfer_3_piece_9, bisect_by=Plane(origin=(-82, 10.112698884, -84.362076481), z_dir=(-1, 0, 0)), keep=Keep.TOP, mode=Mode.PRIVATE)
    add(chamfer_3_piece_9)
    with BuildSketch(Plane(origin=(-72, 10, -75), x_dir=(0, -0.027495876610586147, -0.9996219169112968), z_dir=(-1, 0, 0))) as chamfer_3_piece_10_section:
        Polygon((CHAMFER_3_SIZE * 0.999621916911, -CHAMFER_3_SIZE * 0.0274958766106), (-CHAMFER_3_SIZE * 0.0274958766106, -CHAMFER_3_SIZE * 0.999621916911), (0, 0), align=None)
    chamfer_3_piece_10 = extrude(amount=30, mode=Mode.PRIVATE)
    chamfer_3_piece_10 = split(chamfer_3_piece_10, bisect_by=Plane(origin=(-88.79150551, 13.309351743, -86.097404939), z_dir=(-0.382683432365518, 0, 0.9238795325111094)), keep=Keep.TOP, mode=Mode.PRIVATE)
    chamfer_3_piece_10 = split(chamfer_3_piece_10, bisect_by=Plane(origin=(-82, 13.309351743, -78.276203383), z_dir=(-1, 0, 0)), keep=Keep.TOP, mode=Mode.PRIVATE)
    add(chamfer_3_piece_10)
    with BuildSketch(Plane(origin=(-72, 10, -185), x_dir=(0, -0.027495876610586528, 0.9996219169112968), z_dir=(-1, 0, 0))) as chamfer_3_piece_11_section:
        Polygon((CHAMFER_3_SIZE * 0.999621916911, CHAMFER_3_SIZE * 0.0274958766106), (-CHAMFER_3_SIZE * 0.0274958766106, CHAMFER_3_SIZE * 0.999621916911), (0, 0), align=None)
    chamfer_3_piece_11 = extrude(amount=30, mode=Mode.PRIVATE)
    chamfer_3_piece_11 = split(chamfer_3_piece_11, bisect_by=Plane(origin=(-82, 13.801206253, -182.64685828), z_dir=(1, 0, 0)), keep=Keep.TOP, mode=Mode.PRIVATE)
    chamfer_3_piece_11 = split(chamfer_3_piece_11, bisect_by=Plane(origin=(-76.267264743, 13.801206253, -180.732735257), z_dir=(-0.7071067811865476, 0, -0.7071067811865476)), keep=Keep.TOP, mode=Mode.PRIVATE)
    add(chamfer_3_piece_11)
    with BuildSketch(Plane(origin=(-72, 10, -185), x_dir=(0, -0.027495876610586528, 0.9996219169112968), z_dir=(-1, 0, 0))) as chamfer_3_piece_12_section:
        Polygon((CHAMFER_3_SIZE * 0.999621916911, CHAMFER_3_SIZE * 0.0274958766106), (-CHAMFER_3_SIZE * 0.0274958766106, CHAMFER_3_SIZE * 0.999621916911), (0, 0), align=None)
    chamfer_3_piece_12 = extrude(amount=30, mode=Mode.PRIVATE)
    chamfer_3_piece_12 = split(chamfer_3_piece_12, bisect_by=Plane(origin=(-82, 13.297973997, -181.702135358), z_dir=(-1, 0, 0)), keep=Keep.TOP, mode=Mode.PRIVATE)
    chamfer_3_piece_12 = split(chamfer_3_piece_12, bisect_by=Plane(origin=(-83.648983948, 13.297973997, -173.351016052), z_dir=(-0.7071067811865476, 0, -0.7071067811865476)), keep=Keep.TOP, mode=Mode.PRIVATE)
    add(chamfer_3_piece_12)
    with BuildSketch(Plane(origin=(0, 10, -185), x_dir=(0, -0.027495876610586528, 0.9996219169112968), z_dir=(-1, 0, 0))) as chamfer_3_piece_13_section:
        Polygon((CHAMFER_3_SIZE * 0.999621916911, CHAMFER_3_SIZE * 0.0274958766106), (-CHAMFER_3_SIZE * 0.0274958766106, CHAMFER_3_SIZE * 0.999621916911), (0, 0), align=None)
    chamfer_3_piece_13 = extrude(amount=30, mode=Mode.PRIVATE)
    chamfer_3_piece_13 = split(chamfer_3_piece_13, bisect_by=Plane(origin=(-18.351016052, 13.297973997, -173.351016052), z_dir=(0.7071067811865476, 0, -0.7071067811865476)), keep=Keep.TOP, mode=Mode.PRIVATE)
    chamfer_3_piece_13 = split(chamfer_3_piece_13, bisect_by=Plane(origin=(-20, 13.297973997, -181.702135358), z_dir=(1, 0, 0)), keep=Keep.TOP, mode=Mode.PRIVATE)
    add(chamfer_3_piece_13)
    with BuildSketch(Plane(origin=(0, 10, -185), x_dir=(0, -0.027495876610586528, 0.9996219169112968), z_dir=(-1, 0, 0))) as chamfer_3_piece_14_section:
        Polygon((CHAMFER_3_SIZE * 0.999621916911, CHAMFER_3_SIZE * 0.0274958766106), (-CHAMFER_3_SIZE * 0.0274958766106, CHAMFER_3_SIZE * 0.999621916911), (0, 0), align=None)
    chamfer_3_piece_14 = extrude(amount=30, mode=Mode.PRIVATE)
    chamfer_3_piece_14 = split(chamfer_3_piece_14, bisect_by=Plane(origin=(-25.732735257, 13.801206253, -180.732735257), z_dir=(0.7071067811865476, 0, -0.7071067811865476)), keep=Keep.TOP, mode=Mode.PRIVATE)
    chamfer_3_piece_14 = split(chamfer_3_piece_14, bisect_by=Plane(origin=(-20, 13.801206253, -182.64685828), z_dir=(-1, 0, 0)), keep=Keep.TOP, mode=Mode.PRIVATE)
    add(chamfer_3_piece_14)


solid = part.part
